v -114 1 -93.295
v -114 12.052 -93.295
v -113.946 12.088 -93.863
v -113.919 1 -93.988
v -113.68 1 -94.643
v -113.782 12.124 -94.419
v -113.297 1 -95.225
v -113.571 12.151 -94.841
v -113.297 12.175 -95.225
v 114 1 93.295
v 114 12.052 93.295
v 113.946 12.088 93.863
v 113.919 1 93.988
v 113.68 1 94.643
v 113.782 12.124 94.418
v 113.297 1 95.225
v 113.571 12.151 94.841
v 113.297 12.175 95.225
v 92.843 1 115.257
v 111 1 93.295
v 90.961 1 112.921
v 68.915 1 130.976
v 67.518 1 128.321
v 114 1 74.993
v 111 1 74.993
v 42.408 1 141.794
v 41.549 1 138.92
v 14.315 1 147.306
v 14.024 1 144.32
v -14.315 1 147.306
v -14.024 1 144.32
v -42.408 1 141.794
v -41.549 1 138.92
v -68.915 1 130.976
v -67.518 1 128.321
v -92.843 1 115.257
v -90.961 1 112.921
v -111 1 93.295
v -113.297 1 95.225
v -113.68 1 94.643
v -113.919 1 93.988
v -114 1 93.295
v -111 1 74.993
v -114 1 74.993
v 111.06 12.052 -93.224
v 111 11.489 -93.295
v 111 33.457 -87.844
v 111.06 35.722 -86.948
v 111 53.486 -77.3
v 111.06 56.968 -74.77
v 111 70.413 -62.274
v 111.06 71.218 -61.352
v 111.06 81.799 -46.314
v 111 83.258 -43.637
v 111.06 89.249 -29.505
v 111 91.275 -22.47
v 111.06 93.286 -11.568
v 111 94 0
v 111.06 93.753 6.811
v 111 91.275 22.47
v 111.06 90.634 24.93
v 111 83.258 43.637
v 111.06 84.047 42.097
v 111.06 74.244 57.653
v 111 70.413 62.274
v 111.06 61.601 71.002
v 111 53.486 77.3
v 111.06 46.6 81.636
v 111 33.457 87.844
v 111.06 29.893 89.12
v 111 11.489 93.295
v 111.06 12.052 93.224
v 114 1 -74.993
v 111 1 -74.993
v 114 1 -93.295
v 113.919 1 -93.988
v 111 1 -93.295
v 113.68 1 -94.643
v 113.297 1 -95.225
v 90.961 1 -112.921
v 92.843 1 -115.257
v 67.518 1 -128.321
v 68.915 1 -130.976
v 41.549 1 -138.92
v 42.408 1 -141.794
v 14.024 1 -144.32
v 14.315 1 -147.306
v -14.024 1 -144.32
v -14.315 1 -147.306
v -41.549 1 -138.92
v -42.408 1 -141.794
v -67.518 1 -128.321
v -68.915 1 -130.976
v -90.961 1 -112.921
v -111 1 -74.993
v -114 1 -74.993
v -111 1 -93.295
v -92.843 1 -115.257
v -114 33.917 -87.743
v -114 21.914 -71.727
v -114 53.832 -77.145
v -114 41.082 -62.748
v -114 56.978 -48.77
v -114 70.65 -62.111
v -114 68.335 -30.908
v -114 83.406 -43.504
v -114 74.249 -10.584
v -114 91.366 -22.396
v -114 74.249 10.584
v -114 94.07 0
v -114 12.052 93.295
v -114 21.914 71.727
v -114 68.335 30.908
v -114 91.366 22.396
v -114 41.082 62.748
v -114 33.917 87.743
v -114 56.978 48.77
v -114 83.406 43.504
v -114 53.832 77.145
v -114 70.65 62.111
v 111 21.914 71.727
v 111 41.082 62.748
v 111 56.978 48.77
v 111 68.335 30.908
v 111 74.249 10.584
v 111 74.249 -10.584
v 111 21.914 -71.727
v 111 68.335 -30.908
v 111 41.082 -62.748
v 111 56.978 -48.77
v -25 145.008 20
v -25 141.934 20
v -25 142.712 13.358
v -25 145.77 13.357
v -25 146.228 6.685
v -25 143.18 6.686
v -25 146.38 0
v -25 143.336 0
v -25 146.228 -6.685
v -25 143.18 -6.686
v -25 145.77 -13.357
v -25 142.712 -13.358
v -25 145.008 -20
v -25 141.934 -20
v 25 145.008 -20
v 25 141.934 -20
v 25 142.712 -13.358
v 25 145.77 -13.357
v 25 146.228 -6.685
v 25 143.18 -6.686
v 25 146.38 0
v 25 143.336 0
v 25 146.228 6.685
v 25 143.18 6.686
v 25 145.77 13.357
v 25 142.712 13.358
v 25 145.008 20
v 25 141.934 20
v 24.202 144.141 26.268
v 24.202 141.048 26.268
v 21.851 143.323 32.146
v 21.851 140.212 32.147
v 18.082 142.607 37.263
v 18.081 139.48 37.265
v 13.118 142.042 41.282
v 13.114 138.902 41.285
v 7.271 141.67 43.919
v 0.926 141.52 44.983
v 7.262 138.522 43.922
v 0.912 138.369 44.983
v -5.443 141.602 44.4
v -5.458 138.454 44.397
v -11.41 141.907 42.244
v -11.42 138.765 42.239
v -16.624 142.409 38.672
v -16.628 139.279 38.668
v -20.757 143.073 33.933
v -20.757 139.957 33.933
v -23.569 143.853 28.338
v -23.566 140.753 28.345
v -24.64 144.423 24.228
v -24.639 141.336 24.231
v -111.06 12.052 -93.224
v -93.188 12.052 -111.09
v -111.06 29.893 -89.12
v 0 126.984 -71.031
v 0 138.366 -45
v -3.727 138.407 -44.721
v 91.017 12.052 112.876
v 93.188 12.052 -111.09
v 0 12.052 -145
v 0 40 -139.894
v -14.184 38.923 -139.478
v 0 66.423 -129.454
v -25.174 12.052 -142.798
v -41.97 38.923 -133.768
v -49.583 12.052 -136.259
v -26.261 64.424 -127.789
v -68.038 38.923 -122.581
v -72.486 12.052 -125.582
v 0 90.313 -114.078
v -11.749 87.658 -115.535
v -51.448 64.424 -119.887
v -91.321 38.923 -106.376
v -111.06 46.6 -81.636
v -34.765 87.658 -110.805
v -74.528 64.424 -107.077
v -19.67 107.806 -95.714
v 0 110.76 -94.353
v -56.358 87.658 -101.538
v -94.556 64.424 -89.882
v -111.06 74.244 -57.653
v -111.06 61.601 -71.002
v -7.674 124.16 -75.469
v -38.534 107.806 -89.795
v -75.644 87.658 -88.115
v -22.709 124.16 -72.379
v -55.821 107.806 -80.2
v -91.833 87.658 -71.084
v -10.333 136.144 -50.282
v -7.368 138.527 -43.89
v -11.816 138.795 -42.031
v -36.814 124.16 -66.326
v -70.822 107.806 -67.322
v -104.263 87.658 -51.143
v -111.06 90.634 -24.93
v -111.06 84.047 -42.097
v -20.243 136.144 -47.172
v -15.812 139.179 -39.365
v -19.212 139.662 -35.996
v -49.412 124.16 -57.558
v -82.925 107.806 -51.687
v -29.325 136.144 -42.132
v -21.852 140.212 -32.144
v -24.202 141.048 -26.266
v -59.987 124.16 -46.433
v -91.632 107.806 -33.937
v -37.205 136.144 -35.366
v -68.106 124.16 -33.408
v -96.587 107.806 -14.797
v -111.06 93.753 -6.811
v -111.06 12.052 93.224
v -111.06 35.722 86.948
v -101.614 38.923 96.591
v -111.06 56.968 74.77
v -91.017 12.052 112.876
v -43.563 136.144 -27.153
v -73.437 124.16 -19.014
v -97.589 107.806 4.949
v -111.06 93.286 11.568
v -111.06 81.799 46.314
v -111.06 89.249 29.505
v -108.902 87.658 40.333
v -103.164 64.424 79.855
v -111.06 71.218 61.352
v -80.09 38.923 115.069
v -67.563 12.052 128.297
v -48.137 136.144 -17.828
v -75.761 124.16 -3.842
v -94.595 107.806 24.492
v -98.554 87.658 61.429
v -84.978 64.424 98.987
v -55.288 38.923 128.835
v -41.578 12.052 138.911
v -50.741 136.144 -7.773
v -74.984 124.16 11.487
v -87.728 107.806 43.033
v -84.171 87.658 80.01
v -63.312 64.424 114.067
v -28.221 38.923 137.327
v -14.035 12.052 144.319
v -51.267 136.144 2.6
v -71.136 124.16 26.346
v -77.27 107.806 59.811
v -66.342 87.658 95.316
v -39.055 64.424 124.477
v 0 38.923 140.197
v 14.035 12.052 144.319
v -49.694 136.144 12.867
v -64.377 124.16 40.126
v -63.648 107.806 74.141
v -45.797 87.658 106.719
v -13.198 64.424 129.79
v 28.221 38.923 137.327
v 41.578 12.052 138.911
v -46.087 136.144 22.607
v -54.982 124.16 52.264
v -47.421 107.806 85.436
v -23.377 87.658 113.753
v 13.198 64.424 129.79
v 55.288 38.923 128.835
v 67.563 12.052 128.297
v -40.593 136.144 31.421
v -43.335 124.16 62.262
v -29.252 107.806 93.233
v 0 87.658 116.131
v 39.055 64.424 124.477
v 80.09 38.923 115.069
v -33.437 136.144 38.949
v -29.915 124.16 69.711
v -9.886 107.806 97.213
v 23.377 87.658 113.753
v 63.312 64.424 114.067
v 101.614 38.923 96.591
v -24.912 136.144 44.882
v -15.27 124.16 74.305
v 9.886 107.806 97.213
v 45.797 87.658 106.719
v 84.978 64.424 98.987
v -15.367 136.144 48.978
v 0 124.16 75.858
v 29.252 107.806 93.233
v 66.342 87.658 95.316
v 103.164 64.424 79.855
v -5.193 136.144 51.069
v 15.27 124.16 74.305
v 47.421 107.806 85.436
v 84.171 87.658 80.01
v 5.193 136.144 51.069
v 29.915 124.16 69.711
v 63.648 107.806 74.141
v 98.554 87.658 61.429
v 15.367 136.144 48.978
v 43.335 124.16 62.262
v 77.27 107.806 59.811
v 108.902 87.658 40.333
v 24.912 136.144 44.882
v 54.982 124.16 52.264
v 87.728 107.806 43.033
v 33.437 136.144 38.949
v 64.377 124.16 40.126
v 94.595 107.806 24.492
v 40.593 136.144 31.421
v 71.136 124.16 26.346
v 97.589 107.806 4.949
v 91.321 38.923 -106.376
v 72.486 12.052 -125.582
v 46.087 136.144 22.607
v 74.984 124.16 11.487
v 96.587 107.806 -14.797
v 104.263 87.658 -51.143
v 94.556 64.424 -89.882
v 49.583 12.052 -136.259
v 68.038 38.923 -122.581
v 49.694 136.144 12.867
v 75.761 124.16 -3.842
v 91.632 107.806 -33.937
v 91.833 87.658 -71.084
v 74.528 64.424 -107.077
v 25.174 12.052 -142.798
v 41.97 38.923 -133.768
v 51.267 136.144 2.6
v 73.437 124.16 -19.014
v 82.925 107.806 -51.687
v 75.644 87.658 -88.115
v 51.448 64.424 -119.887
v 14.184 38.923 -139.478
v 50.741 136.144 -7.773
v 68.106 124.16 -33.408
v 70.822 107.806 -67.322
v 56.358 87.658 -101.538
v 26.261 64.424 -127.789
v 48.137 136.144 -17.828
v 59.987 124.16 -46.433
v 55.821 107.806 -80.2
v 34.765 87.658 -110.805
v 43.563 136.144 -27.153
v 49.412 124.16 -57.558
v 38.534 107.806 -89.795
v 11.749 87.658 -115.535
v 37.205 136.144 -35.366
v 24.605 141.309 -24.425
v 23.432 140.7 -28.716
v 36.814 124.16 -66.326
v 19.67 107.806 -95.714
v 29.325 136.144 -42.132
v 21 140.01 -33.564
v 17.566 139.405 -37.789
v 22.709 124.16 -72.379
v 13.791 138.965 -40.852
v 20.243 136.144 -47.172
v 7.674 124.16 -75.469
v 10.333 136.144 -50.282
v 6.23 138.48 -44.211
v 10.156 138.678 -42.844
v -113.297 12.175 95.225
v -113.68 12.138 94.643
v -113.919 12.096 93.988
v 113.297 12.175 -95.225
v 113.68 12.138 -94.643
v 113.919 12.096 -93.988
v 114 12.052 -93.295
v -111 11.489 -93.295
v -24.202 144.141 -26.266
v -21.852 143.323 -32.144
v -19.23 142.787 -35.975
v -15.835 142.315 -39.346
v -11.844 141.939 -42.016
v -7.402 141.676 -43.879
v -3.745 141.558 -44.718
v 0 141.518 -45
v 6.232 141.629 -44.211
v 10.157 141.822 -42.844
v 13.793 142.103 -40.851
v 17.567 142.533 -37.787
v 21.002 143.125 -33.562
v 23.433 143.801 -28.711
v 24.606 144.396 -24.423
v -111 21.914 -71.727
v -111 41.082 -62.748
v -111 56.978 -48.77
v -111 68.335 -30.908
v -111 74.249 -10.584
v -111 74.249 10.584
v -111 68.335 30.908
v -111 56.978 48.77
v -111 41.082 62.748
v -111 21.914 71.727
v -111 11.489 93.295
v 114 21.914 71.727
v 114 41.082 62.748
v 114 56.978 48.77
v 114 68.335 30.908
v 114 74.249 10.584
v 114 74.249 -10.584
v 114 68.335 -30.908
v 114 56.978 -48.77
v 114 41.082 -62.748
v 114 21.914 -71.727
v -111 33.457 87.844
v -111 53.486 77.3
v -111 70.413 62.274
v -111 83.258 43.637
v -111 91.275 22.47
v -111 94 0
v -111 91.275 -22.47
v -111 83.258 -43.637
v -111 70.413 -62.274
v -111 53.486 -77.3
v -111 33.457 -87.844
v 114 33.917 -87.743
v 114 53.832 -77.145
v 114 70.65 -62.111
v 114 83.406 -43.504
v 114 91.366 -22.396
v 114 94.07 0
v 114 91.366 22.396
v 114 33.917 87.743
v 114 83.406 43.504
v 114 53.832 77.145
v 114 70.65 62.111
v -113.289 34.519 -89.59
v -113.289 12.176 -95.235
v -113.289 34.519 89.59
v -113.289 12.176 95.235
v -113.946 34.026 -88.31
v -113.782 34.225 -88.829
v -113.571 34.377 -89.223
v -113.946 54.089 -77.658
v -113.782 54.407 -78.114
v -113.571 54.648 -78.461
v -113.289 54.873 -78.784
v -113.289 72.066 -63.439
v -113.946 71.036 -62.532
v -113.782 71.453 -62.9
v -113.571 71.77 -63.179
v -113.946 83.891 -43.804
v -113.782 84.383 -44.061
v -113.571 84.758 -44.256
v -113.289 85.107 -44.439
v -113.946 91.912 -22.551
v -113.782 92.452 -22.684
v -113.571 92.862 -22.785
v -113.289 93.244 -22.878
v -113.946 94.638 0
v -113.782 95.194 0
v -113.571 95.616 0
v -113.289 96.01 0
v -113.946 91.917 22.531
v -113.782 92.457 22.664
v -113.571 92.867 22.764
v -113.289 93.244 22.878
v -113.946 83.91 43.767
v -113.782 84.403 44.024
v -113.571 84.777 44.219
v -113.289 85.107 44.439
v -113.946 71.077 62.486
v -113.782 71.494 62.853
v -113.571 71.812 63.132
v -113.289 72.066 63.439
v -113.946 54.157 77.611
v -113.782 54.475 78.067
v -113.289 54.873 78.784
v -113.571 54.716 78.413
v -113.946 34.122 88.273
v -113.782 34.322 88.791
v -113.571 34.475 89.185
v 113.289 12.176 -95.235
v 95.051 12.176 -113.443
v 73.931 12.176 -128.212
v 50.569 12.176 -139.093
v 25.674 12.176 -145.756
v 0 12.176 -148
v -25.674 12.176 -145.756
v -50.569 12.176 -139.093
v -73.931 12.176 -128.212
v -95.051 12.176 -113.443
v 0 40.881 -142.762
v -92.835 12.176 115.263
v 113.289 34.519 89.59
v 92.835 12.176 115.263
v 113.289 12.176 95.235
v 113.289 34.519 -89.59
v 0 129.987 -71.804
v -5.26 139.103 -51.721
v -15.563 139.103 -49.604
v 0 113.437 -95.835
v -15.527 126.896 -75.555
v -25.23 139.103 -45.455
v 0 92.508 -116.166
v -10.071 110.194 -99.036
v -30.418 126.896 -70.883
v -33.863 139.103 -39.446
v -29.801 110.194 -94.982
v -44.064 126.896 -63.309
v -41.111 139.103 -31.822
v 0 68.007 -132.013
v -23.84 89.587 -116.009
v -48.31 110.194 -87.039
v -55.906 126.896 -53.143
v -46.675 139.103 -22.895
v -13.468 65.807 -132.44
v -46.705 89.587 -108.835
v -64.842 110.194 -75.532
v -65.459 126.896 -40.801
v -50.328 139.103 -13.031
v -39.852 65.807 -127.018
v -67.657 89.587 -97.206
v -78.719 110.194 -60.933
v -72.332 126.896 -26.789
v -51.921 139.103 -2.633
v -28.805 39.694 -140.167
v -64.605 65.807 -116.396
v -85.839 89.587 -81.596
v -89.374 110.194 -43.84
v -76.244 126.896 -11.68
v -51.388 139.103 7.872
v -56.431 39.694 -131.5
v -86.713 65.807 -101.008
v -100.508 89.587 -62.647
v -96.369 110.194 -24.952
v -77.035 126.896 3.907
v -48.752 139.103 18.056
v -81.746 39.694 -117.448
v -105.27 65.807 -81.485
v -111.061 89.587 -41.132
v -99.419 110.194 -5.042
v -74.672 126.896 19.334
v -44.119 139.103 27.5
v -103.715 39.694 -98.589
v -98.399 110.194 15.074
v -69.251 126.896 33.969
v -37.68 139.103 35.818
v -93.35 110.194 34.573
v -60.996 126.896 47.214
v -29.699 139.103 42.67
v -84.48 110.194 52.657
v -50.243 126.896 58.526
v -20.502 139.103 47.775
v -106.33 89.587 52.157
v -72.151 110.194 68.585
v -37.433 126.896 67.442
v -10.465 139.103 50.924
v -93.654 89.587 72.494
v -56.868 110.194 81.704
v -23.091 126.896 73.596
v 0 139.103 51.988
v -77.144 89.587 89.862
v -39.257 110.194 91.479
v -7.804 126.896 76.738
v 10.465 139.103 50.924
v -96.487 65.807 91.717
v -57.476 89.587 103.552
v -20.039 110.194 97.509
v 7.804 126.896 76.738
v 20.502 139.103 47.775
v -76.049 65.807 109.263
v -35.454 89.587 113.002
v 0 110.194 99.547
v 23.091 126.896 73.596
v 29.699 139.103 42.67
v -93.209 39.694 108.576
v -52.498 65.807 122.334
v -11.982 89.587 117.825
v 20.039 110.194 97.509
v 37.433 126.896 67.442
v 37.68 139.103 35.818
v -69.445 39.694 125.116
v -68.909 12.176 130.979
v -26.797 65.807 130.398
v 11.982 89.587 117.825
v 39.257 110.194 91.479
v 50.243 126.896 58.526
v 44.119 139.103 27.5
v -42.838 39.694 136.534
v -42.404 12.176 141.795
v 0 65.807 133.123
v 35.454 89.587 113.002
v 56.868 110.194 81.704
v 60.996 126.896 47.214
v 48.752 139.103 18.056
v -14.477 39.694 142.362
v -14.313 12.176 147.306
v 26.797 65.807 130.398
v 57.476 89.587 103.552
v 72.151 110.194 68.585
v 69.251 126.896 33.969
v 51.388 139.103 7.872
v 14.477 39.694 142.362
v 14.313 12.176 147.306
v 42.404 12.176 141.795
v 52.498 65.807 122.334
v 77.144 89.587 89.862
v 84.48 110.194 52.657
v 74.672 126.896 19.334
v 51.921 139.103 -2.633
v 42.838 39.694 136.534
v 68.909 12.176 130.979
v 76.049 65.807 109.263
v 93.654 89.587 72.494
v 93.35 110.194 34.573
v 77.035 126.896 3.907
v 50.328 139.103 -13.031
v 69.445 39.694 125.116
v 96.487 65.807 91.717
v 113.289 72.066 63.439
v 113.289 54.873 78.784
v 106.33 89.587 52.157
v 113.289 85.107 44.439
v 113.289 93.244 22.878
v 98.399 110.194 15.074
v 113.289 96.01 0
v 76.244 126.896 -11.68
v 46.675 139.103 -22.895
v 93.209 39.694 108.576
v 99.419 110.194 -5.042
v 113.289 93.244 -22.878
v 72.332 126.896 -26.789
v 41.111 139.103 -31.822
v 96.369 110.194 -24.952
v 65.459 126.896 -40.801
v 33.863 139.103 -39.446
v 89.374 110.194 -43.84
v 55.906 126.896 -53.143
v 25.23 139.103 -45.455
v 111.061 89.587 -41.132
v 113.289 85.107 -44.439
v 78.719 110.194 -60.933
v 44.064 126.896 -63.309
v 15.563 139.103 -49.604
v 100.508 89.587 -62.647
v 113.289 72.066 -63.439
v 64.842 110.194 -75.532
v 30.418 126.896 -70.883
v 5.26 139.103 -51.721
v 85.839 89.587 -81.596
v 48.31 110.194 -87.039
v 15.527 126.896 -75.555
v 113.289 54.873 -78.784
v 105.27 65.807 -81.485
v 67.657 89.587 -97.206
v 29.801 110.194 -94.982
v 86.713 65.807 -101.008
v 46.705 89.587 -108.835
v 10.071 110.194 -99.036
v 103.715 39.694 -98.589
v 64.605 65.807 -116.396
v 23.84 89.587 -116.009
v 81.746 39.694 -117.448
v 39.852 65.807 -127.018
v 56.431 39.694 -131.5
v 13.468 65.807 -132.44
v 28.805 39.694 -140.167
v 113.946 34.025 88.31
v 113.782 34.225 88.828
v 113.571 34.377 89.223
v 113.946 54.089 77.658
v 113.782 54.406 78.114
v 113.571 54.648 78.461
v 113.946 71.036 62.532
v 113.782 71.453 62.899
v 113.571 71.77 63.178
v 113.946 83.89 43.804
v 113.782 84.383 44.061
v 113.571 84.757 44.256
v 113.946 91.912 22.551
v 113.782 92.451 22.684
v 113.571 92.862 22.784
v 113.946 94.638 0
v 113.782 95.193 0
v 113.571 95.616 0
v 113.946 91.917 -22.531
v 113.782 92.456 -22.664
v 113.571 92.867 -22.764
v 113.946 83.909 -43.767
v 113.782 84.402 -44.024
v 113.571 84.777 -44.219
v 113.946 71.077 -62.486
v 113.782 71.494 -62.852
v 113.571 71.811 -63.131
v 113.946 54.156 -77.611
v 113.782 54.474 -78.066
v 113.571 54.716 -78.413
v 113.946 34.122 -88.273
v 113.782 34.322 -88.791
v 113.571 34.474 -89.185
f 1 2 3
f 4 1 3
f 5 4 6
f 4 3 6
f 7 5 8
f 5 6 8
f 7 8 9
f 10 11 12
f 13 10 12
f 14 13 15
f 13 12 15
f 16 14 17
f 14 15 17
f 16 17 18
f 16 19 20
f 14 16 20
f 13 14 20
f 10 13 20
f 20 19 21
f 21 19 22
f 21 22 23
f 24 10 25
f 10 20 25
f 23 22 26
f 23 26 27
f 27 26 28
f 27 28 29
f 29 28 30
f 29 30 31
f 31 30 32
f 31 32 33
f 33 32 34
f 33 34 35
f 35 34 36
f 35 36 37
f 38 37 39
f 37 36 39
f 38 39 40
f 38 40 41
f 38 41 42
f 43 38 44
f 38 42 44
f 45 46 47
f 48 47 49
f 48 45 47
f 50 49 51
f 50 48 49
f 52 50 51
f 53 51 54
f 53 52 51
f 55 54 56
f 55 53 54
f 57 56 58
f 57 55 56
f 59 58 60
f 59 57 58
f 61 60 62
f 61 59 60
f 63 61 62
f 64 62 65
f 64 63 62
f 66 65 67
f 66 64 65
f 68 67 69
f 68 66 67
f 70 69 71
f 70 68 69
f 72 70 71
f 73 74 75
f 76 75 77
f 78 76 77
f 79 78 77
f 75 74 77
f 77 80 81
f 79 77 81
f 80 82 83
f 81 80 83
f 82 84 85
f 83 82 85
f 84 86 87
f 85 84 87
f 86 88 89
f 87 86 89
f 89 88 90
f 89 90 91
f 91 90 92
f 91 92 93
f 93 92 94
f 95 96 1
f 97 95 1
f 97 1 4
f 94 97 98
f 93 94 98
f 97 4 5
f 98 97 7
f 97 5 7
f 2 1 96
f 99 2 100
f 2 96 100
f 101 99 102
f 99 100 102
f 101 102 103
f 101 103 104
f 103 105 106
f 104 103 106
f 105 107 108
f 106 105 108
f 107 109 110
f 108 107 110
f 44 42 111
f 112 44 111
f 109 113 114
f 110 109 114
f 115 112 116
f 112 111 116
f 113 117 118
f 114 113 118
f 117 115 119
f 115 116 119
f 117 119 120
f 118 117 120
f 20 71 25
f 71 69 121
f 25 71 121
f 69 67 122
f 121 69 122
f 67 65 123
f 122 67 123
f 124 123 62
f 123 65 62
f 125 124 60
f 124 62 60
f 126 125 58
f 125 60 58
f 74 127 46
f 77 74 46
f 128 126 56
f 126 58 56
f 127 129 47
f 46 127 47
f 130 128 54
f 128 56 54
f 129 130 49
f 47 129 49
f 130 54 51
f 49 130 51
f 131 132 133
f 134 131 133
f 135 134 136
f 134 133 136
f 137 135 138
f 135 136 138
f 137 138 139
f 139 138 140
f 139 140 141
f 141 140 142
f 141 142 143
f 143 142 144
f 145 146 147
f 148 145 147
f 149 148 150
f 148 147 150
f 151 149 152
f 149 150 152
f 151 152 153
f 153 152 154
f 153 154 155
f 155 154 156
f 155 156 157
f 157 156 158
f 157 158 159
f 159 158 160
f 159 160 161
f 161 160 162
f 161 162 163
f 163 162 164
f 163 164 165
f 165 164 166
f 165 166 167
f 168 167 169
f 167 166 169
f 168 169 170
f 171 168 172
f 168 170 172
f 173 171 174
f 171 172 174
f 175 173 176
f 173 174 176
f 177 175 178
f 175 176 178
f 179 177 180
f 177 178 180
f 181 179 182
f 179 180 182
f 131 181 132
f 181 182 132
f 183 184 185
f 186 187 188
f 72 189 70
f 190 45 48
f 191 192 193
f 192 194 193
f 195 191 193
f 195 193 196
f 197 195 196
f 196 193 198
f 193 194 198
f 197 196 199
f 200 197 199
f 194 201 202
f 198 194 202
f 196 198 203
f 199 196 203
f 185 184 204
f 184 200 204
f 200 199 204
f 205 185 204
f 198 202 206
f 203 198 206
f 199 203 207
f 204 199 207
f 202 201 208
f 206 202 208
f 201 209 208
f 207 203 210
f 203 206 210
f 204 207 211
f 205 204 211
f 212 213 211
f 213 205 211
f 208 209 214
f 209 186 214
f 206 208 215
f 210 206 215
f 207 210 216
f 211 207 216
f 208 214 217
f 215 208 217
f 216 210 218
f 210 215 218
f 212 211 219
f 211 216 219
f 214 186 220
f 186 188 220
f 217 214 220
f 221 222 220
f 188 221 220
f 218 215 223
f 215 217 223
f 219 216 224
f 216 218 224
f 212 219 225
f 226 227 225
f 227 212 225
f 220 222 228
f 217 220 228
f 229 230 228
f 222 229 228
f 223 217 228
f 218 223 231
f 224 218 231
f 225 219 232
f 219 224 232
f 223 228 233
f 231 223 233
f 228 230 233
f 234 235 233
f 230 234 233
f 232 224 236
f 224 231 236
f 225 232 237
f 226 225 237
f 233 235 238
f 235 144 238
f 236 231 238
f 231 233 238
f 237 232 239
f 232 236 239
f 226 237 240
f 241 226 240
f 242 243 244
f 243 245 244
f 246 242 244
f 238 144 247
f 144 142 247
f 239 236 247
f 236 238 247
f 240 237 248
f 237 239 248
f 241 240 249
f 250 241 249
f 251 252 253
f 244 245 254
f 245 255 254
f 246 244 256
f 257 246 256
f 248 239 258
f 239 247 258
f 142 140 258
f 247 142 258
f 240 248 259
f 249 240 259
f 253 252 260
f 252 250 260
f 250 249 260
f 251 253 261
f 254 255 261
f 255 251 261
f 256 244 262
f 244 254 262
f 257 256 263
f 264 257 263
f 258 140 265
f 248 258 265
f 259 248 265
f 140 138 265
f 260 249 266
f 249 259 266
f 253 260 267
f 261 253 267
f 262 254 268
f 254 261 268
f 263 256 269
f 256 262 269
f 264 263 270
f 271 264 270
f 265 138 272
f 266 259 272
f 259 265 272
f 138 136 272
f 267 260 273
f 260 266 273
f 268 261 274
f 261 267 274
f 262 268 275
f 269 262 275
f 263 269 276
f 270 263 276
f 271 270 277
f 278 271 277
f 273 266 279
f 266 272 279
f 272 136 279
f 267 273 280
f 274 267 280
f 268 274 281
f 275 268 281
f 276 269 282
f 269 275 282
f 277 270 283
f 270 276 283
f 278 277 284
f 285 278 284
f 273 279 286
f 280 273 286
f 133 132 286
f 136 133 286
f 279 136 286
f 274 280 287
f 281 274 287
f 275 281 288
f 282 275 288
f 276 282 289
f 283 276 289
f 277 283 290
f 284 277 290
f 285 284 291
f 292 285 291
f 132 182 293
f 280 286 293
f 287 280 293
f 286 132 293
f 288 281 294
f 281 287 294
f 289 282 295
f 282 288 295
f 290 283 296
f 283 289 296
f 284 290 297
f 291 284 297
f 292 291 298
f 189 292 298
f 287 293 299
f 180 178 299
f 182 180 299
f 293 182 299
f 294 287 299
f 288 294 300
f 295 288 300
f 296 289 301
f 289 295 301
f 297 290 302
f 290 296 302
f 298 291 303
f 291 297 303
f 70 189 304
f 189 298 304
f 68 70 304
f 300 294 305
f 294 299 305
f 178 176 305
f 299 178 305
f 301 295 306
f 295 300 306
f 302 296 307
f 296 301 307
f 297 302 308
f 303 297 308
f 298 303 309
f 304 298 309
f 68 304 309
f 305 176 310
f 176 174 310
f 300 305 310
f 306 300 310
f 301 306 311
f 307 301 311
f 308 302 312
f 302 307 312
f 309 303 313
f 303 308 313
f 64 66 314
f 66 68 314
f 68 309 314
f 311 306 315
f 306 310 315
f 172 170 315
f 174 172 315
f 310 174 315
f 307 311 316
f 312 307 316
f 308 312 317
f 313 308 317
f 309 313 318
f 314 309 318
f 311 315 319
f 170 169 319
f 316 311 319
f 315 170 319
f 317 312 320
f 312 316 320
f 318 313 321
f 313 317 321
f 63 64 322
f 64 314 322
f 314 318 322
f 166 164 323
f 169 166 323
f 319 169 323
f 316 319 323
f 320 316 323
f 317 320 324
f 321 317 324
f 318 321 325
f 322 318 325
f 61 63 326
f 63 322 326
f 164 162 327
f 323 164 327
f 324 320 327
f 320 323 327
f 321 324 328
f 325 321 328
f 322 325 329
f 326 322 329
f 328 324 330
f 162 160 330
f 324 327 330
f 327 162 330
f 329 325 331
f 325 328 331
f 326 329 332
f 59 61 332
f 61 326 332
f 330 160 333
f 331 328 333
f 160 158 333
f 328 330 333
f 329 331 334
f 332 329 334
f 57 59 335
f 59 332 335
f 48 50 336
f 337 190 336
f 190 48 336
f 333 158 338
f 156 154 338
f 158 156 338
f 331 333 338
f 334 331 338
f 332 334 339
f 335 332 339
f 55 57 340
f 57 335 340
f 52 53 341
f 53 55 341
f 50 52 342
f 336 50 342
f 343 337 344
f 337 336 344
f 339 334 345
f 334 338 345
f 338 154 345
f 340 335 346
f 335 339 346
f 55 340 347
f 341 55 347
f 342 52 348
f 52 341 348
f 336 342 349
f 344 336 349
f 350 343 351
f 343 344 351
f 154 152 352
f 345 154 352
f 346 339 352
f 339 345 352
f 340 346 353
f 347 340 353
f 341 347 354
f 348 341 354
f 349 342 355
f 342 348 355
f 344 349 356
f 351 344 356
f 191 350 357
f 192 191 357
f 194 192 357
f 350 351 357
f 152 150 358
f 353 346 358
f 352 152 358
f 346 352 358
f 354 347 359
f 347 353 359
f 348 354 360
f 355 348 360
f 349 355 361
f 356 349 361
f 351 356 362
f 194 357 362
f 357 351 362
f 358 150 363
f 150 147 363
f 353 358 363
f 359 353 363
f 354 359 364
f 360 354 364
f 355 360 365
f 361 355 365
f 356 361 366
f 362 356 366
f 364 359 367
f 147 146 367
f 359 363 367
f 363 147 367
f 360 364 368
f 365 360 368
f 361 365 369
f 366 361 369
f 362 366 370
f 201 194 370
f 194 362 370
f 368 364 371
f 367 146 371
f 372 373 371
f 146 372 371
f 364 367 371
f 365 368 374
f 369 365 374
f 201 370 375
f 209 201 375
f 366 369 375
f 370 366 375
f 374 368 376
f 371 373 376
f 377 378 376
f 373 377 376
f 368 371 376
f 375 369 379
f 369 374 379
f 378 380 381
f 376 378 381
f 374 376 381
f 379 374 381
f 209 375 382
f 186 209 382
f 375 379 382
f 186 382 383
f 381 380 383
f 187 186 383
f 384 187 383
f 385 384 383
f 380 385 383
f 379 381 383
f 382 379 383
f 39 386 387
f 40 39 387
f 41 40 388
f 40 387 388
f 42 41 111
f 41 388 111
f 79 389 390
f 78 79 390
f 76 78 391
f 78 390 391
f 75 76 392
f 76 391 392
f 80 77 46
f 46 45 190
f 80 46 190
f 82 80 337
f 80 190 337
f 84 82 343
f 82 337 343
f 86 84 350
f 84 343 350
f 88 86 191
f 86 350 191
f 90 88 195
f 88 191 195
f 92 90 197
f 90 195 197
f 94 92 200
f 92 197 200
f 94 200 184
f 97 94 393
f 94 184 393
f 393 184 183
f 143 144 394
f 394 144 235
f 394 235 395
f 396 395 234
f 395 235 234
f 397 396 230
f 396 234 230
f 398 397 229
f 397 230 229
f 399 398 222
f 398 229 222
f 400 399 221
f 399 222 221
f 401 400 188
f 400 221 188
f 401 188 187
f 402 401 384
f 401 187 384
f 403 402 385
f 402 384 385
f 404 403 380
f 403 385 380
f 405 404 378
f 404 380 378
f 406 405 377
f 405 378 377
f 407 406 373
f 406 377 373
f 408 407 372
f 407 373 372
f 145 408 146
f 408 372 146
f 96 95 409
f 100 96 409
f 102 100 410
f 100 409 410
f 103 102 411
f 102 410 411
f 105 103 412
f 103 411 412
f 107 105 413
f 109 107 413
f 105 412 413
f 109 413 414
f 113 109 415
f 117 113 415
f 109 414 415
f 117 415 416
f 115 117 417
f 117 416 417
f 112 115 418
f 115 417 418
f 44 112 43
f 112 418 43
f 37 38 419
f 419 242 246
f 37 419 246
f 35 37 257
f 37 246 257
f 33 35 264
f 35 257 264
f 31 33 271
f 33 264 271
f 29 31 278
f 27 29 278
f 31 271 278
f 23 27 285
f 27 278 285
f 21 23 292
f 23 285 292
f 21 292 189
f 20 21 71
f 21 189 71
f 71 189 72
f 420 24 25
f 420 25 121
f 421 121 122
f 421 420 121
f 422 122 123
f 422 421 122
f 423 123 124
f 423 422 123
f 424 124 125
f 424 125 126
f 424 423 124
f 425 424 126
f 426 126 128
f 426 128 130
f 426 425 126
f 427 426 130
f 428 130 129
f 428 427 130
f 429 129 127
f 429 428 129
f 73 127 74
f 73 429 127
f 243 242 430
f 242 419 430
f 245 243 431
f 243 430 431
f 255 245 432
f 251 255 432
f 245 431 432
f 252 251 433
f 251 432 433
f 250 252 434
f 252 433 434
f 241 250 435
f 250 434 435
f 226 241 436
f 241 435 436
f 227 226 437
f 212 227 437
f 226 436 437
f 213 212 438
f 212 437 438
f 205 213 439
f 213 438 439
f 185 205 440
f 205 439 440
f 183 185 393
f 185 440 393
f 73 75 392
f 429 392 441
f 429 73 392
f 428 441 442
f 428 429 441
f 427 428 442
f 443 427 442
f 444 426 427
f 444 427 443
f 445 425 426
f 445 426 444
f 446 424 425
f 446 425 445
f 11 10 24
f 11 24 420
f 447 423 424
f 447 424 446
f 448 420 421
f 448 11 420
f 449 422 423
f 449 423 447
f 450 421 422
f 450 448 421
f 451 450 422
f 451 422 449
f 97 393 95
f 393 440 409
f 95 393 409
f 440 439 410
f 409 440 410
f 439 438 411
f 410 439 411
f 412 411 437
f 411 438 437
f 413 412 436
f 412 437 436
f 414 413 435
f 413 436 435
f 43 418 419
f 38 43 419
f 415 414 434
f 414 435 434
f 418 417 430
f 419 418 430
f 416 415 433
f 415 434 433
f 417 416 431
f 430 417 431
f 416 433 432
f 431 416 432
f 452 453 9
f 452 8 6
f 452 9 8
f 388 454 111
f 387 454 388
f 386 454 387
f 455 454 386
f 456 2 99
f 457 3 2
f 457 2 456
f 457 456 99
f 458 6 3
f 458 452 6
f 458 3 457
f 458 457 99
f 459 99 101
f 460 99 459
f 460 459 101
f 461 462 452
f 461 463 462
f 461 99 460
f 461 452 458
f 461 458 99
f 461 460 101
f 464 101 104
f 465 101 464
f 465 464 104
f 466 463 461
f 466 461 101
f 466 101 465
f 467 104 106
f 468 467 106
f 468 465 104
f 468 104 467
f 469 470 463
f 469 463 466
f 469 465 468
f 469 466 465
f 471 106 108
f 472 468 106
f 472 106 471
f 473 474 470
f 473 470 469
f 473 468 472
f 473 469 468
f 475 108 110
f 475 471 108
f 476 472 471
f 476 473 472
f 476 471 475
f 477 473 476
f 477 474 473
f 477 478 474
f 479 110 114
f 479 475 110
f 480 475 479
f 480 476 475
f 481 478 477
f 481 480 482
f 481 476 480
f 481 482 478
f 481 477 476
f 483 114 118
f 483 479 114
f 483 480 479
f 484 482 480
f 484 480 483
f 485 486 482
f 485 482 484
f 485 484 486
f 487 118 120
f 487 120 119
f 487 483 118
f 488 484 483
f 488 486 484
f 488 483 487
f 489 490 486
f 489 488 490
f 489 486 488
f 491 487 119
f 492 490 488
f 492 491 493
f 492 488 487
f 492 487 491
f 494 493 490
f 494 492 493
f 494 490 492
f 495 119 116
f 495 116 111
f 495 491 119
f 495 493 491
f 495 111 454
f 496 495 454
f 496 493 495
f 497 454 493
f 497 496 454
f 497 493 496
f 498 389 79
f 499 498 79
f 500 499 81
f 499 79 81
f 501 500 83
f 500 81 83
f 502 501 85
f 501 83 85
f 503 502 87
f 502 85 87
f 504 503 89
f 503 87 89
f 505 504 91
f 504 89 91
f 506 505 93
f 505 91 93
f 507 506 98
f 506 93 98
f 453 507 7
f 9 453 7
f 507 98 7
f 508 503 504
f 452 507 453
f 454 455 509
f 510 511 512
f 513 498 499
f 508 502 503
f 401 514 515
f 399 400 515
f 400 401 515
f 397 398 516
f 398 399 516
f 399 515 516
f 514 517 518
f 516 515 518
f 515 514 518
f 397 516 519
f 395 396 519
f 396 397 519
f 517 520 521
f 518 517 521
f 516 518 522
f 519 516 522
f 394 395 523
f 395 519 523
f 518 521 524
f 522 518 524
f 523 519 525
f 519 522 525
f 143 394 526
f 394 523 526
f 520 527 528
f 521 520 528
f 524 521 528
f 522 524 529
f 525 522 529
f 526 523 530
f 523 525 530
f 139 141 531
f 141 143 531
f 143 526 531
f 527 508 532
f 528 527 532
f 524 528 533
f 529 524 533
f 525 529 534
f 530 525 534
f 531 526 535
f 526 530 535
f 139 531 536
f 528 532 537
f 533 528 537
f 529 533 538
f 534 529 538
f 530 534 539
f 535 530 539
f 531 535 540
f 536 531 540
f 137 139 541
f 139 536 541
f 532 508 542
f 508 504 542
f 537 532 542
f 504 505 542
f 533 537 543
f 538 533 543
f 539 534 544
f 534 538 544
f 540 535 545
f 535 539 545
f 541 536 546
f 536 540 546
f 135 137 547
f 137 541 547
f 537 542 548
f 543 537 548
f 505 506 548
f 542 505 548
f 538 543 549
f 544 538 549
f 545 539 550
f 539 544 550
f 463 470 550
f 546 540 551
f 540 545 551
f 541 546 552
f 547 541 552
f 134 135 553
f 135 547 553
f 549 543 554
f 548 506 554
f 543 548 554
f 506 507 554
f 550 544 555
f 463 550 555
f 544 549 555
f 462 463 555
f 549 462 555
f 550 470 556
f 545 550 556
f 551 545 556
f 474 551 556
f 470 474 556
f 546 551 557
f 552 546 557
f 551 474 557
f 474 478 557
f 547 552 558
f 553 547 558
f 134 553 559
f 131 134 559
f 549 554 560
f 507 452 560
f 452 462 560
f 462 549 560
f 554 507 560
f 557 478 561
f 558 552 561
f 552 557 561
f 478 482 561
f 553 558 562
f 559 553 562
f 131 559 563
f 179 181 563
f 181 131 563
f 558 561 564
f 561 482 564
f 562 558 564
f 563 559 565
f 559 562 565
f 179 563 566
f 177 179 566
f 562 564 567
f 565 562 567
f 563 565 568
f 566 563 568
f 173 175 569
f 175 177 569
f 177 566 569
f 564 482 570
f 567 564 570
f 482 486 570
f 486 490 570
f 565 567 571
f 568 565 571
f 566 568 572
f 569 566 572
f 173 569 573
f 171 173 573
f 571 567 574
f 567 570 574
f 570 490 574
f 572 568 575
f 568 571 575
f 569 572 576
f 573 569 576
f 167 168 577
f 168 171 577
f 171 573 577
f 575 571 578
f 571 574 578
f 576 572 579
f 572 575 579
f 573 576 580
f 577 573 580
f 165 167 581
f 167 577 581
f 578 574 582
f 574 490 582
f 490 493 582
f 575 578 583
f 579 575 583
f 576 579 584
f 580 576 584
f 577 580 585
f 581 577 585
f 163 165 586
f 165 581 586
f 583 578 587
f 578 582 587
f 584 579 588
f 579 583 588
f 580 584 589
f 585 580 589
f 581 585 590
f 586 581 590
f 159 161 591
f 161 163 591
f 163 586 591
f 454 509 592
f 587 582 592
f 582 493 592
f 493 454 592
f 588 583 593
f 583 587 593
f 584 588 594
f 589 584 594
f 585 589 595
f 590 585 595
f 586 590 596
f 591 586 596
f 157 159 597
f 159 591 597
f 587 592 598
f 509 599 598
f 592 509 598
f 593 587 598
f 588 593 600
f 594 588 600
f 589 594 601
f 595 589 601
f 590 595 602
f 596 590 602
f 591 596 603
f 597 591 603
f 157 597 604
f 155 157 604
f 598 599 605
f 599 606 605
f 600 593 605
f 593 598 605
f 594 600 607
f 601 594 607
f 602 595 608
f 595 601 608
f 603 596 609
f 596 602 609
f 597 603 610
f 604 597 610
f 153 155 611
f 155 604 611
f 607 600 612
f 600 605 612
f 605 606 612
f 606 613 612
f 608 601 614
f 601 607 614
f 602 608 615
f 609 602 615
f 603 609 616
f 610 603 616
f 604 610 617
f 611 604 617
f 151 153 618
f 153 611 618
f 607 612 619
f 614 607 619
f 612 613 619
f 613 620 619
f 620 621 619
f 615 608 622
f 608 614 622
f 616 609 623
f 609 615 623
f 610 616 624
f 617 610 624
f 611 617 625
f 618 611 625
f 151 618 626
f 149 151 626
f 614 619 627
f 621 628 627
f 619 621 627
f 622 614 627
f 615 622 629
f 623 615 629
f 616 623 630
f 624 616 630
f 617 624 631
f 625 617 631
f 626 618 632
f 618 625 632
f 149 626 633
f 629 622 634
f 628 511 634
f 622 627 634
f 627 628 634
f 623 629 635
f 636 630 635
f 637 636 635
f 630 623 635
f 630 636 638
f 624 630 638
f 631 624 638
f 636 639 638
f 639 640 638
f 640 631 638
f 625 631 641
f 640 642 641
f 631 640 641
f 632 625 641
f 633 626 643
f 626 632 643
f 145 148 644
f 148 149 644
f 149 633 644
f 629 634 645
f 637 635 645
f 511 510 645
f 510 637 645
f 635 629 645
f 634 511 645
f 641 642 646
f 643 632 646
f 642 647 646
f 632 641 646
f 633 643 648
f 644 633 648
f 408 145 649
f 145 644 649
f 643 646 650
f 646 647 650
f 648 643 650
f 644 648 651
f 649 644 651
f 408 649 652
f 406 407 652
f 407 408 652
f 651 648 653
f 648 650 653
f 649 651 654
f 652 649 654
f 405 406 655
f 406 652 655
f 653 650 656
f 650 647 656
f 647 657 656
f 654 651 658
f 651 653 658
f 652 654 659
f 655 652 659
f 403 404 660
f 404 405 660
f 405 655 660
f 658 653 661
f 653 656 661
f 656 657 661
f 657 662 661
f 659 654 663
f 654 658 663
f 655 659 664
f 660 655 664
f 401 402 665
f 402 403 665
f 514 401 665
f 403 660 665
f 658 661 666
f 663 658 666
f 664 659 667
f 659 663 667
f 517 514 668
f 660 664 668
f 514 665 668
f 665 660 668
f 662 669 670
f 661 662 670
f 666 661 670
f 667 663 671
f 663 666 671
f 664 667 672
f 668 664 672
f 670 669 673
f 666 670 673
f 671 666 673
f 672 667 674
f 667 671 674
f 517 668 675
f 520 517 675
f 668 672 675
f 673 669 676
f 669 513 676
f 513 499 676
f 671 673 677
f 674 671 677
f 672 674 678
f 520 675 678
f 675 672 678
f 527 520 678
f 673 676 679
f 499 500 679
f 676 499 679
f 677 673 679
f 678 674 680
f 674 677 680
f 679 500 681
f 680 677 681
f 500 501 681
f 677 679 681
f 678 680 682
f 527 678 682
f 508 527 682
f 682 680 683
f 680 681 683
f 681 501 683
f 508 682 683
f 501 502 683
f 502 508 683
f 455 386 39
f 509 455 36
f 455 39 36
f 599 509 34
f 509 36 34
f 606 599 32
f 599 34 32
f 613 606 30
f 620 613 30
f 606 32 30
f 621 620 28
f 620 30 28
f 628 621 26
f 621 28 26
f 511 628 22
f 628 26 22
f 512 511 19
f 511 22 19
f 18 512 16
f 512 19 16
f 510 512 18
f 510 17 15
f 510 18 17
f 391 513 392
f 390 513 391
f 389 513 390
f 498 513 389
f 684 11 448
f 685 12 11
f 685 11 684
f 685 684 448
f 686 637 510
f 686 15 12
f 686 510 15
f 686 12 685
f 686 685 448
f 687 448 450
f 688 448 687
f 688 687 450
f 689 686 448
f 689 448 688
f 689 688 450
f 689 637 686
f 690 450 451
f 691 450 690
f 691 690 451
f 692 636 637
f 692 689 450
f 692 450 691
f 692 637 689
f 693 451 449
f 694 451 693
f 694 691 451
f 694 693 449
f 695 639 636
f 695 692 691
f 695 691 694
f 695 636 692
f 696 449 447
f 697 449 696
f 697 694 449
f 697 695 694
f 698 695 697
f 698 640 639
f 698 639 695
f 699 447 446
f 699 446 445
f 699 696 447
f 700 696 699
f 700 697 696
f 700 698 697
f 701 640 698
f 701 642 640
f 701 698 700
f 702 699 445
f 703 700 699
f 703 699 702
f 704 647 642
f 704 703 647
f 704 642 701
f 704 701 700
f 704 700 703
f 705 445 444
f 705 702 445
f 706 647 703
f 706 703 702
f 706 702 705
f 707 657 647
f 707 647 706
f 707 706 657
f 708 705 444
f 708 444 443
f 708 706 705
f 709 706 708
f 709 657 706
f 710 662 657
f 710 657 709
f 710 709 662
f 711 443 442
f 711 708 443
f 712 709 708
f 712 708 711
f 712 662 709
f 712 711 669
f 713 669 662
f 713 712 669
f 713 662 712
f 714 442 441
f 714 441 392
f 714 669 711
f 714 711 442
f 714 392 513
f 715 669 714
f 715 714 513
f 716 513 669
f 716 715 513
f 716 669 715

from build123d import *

# Parameters (mm, degrees)
ESQUISSE2_OUTSIDE_W     = 386.766
ESQUISSE2_OUTSIDE_H     = 238.266
ESQUISSE2_OUTSIDE_W_2   = 228
ESQUISSE2_OUTSIDE_H_2   = 155
ENL_V_MAT_EXTRU_1_DEPTH = 150
ENL_V_MAT_EXTRU_2_DEPTH = 239.646705404
BOSS_EXTRU_1_DEPTH      = 3
BOSS_EXTRU_2_START      = -3
BOSS_EXTRU_2_DEPTH      = 3
CONG_9_R                = 3


with BuildPart() as part:
    # Esquisse1 → Révolution4 (revolve)
    with BuildSketch(Plane.XY, mode=Mode.PRIVATE) as r_volution4_sk:
        with BuildLine():
            Line((148, 12.175795662), (148, 1))
            Line((148, 1), (145, 1))
            Line((145, 1), (145, 12.051970793))
            ThreePointArc((145, 12.051970793), (98.530929788, 107.060290842), (0, 145.5))
            Line((0, 145.5), (0, 148.5))
            ThreePointArc((0, 148.5), (100.608509442, 109.225353412), (148, 12.175795662))
        make_face()
    revolve(r_volution4_sk.sketch.rotate(Axis((0, 0, 0), (0, 1, 0)), 90), axis=Axis((0, 0, 0), (0, 1, 0)))

    # Esquisse2 outside → Enlèv. mat.-Extru.1 (cut, symmetric)
    with BuildSketch(Plane.XY):
        with Locations((0, 74.75)):
            Rectangle(ESQUISSE2_OUTSIDE_W, ESQUISSE2_OUTSIDE_H)
        with Locations((0, 72.5)):
            Rectangle(ESQUISSE2_OUTSIDE_W_2, ESQUISSE2_OUTSIDE_H_2, mode=Mode.SUBTRACT)
    extrude(amount=ENL_V_MAT_EXTRU_1_DEPTH, both=True, mode=Mode.SUBTRACT)

    # Esquisse3 → Enlèv. mat.-Extru.2 (cut, through all)
    with BuildSketch(Plane(origin=(0, 0, 0), x_dir=(1, 0, 0), z_dir=(0, 1, 0))):
        with BuildLine():
            Line((-25, -20), (-25, 20))
            ThreePointArc((-25, 20), (0, 45), (25, 20))
            Line((25, 20), (25, -20))
            ThreePointArc((25, -20), (0, -45), (-25, -20))
        make_face()
    extrude(amount=ENL_V_MAT_EXTRU_2_DEPTH, mode=Mode.SUBTRACT)

    # Esquisse4 → Boss.-Extru.1 (add)
    with BuildSketch(Plane(origin=(114, 0, 0), x_dir=(0, 0, -1), z_dir=(1, 0, 0))):
        with BuildLine():
            Line((-93.994680701, 1), (-74.993333037, 1))
            ThreePointArc((-74.993333037, 1), (0, 75), (74.993333037, 1))
            Line((74.993333037, 1), (93.994680701, 1))
            ThreePointArc((93.994680701, 1), (0, 94), (-93.994680701, 1))
        make_face()
    extrude(amount=-BOSS_EXTRU_1_DEPTH)

    # Esquisse5 → Boss.-Extru.2 (add)
    with BuildSketch(Plane.ZY.offset(114).offset(BOSS_EXTRU_2_START)):
        with BuildLine():
            Line((-93.994680701, 1), (-74.993333037, 1))
            ThreePointArc((-74.993333037, 1), (0, 75), (74.993333037, 1))
            Line((74.993333037, 1), (93.994680701, 1))
            ThreePointArc((93.994680701, 1), (0, 94), (-93.994680701, 1))
        make_face()
    extrude(amount=BOSS_EXTRU_2_DEPTH)

    # Congé9
    # the kernel refuses this fillet: 3 mm, written as the material it takes off along each edge
    with BuildSketch(Plane(origin=(-114, 20.411983352, -94.382201712), x_dir=(0.6405708887604551, 0, -0.767899040546764), z_dir=(0, -1, 0)), Plane(origin=(114, 20.411983352, 94.382201712), x_dir=(-0.6405708887604538, 0, 0.7678990405467649), z_dir=(0, -1, 0))) as cong_9_piece_1:
        with BuildLine():
            CenterArc((1.087028375, 2.999979354), CONG_9_R, 230.165597581, 40.046969931)
            Line((-0.834684291, 0.696282232), (0, 0))
            ThreePointArc((0, 0), (0.549079179, -0.001018544), (1.098158359, 0))
        make_face()
    extrude(amount=22.157379249, mode=Mode.SUBTRACT)
    with BuildSketch(Plane(origin=(-114, 0, 0), x_dir=(0, 0.09906318090270165, -0.9950811455300712), z_dir=(0, -0.9950811455300712, -0.09906318090270165))) as cong_9_piece_2:
        with BuildLine():
            CenterArc((94.070452322, 3), CONG_9_R, 270, 40.28066089)
            ThreePointArc((96.010049277, 0.711340206), (95.587852119, 0.354883399), (95.164331553, 0))
            Line((95.164331553, 0), (94.070452322, 0))
        make_face()
    revolve(axis=Axis((-114, 0, 0), (1, 0, 0)), revolution_arc=168.629546335, mode=Mode.SUBTRACT)
    with BuildSketch(Plane(origin=(-114, 20.411983352, 94.382201712), x_dir=(0, 0, -1), z_dir=(0, -1, 0))) as cong_9_piece_3:
        with BuildLine():
            CenterArc((1.086971394, 3), CONG_9_R, 229.953030069, 40.046969931)
            ThreePointArc((-0.84327475, 0.703448276), (-0.422289825, 0.350941999), (0, 0))
            Line((0, 0), (1.086971394, 0))
        make_face()
    extrude(amount=22.157379249, mode=Mode.SUBTRACT)
    with BuildSketch(Plane(origin=(114, 0, 0), x_dir=(0, 0.09906318090270108, 0.9950811455300712), z_dir=(0, -0.9950811455300712, 0.09906318090270108))) as cong_9_piece_4:
        with BuildLine():
            CenterArc((94.070452322, 3), CONG_9_R, 270, 40.28066089)
            Line((94.070452322, 0), (95.164331553, 0))
            ThreePointArc((95.164331553, 0), (95.587852119, 0.354883399), (96.010049277, 0.711340206))
        make_face()
    revolve(axis=Axis((114, 0, 0), (-1, 0, 0)), revolution_arc=168.629546335, mode=Mode.SUBTRACT)
    with BuildSketch(Plane(origin=(114, 20.411983352, -94.382201712), x_dir=(-0.6405708887604424, 0, -0.7678990405467746), z_dir=(0, -1, 0))) as cong_9_piece_5:
        with BuildLine():
            CenterArc((1.087028375, -2.999979354), CONG_9_R, 89.787432488, 40.046969931)
            Line((-0.834684291, -0.696282232), (0, 0))
            ThreePointArc((0, 0), (0.549079179, 0.001018544), (1.098158359, 0))
        make_face()
    extrude(amount=22.157379249, mode=Mode.SUBTRACT)


solid = part.part
